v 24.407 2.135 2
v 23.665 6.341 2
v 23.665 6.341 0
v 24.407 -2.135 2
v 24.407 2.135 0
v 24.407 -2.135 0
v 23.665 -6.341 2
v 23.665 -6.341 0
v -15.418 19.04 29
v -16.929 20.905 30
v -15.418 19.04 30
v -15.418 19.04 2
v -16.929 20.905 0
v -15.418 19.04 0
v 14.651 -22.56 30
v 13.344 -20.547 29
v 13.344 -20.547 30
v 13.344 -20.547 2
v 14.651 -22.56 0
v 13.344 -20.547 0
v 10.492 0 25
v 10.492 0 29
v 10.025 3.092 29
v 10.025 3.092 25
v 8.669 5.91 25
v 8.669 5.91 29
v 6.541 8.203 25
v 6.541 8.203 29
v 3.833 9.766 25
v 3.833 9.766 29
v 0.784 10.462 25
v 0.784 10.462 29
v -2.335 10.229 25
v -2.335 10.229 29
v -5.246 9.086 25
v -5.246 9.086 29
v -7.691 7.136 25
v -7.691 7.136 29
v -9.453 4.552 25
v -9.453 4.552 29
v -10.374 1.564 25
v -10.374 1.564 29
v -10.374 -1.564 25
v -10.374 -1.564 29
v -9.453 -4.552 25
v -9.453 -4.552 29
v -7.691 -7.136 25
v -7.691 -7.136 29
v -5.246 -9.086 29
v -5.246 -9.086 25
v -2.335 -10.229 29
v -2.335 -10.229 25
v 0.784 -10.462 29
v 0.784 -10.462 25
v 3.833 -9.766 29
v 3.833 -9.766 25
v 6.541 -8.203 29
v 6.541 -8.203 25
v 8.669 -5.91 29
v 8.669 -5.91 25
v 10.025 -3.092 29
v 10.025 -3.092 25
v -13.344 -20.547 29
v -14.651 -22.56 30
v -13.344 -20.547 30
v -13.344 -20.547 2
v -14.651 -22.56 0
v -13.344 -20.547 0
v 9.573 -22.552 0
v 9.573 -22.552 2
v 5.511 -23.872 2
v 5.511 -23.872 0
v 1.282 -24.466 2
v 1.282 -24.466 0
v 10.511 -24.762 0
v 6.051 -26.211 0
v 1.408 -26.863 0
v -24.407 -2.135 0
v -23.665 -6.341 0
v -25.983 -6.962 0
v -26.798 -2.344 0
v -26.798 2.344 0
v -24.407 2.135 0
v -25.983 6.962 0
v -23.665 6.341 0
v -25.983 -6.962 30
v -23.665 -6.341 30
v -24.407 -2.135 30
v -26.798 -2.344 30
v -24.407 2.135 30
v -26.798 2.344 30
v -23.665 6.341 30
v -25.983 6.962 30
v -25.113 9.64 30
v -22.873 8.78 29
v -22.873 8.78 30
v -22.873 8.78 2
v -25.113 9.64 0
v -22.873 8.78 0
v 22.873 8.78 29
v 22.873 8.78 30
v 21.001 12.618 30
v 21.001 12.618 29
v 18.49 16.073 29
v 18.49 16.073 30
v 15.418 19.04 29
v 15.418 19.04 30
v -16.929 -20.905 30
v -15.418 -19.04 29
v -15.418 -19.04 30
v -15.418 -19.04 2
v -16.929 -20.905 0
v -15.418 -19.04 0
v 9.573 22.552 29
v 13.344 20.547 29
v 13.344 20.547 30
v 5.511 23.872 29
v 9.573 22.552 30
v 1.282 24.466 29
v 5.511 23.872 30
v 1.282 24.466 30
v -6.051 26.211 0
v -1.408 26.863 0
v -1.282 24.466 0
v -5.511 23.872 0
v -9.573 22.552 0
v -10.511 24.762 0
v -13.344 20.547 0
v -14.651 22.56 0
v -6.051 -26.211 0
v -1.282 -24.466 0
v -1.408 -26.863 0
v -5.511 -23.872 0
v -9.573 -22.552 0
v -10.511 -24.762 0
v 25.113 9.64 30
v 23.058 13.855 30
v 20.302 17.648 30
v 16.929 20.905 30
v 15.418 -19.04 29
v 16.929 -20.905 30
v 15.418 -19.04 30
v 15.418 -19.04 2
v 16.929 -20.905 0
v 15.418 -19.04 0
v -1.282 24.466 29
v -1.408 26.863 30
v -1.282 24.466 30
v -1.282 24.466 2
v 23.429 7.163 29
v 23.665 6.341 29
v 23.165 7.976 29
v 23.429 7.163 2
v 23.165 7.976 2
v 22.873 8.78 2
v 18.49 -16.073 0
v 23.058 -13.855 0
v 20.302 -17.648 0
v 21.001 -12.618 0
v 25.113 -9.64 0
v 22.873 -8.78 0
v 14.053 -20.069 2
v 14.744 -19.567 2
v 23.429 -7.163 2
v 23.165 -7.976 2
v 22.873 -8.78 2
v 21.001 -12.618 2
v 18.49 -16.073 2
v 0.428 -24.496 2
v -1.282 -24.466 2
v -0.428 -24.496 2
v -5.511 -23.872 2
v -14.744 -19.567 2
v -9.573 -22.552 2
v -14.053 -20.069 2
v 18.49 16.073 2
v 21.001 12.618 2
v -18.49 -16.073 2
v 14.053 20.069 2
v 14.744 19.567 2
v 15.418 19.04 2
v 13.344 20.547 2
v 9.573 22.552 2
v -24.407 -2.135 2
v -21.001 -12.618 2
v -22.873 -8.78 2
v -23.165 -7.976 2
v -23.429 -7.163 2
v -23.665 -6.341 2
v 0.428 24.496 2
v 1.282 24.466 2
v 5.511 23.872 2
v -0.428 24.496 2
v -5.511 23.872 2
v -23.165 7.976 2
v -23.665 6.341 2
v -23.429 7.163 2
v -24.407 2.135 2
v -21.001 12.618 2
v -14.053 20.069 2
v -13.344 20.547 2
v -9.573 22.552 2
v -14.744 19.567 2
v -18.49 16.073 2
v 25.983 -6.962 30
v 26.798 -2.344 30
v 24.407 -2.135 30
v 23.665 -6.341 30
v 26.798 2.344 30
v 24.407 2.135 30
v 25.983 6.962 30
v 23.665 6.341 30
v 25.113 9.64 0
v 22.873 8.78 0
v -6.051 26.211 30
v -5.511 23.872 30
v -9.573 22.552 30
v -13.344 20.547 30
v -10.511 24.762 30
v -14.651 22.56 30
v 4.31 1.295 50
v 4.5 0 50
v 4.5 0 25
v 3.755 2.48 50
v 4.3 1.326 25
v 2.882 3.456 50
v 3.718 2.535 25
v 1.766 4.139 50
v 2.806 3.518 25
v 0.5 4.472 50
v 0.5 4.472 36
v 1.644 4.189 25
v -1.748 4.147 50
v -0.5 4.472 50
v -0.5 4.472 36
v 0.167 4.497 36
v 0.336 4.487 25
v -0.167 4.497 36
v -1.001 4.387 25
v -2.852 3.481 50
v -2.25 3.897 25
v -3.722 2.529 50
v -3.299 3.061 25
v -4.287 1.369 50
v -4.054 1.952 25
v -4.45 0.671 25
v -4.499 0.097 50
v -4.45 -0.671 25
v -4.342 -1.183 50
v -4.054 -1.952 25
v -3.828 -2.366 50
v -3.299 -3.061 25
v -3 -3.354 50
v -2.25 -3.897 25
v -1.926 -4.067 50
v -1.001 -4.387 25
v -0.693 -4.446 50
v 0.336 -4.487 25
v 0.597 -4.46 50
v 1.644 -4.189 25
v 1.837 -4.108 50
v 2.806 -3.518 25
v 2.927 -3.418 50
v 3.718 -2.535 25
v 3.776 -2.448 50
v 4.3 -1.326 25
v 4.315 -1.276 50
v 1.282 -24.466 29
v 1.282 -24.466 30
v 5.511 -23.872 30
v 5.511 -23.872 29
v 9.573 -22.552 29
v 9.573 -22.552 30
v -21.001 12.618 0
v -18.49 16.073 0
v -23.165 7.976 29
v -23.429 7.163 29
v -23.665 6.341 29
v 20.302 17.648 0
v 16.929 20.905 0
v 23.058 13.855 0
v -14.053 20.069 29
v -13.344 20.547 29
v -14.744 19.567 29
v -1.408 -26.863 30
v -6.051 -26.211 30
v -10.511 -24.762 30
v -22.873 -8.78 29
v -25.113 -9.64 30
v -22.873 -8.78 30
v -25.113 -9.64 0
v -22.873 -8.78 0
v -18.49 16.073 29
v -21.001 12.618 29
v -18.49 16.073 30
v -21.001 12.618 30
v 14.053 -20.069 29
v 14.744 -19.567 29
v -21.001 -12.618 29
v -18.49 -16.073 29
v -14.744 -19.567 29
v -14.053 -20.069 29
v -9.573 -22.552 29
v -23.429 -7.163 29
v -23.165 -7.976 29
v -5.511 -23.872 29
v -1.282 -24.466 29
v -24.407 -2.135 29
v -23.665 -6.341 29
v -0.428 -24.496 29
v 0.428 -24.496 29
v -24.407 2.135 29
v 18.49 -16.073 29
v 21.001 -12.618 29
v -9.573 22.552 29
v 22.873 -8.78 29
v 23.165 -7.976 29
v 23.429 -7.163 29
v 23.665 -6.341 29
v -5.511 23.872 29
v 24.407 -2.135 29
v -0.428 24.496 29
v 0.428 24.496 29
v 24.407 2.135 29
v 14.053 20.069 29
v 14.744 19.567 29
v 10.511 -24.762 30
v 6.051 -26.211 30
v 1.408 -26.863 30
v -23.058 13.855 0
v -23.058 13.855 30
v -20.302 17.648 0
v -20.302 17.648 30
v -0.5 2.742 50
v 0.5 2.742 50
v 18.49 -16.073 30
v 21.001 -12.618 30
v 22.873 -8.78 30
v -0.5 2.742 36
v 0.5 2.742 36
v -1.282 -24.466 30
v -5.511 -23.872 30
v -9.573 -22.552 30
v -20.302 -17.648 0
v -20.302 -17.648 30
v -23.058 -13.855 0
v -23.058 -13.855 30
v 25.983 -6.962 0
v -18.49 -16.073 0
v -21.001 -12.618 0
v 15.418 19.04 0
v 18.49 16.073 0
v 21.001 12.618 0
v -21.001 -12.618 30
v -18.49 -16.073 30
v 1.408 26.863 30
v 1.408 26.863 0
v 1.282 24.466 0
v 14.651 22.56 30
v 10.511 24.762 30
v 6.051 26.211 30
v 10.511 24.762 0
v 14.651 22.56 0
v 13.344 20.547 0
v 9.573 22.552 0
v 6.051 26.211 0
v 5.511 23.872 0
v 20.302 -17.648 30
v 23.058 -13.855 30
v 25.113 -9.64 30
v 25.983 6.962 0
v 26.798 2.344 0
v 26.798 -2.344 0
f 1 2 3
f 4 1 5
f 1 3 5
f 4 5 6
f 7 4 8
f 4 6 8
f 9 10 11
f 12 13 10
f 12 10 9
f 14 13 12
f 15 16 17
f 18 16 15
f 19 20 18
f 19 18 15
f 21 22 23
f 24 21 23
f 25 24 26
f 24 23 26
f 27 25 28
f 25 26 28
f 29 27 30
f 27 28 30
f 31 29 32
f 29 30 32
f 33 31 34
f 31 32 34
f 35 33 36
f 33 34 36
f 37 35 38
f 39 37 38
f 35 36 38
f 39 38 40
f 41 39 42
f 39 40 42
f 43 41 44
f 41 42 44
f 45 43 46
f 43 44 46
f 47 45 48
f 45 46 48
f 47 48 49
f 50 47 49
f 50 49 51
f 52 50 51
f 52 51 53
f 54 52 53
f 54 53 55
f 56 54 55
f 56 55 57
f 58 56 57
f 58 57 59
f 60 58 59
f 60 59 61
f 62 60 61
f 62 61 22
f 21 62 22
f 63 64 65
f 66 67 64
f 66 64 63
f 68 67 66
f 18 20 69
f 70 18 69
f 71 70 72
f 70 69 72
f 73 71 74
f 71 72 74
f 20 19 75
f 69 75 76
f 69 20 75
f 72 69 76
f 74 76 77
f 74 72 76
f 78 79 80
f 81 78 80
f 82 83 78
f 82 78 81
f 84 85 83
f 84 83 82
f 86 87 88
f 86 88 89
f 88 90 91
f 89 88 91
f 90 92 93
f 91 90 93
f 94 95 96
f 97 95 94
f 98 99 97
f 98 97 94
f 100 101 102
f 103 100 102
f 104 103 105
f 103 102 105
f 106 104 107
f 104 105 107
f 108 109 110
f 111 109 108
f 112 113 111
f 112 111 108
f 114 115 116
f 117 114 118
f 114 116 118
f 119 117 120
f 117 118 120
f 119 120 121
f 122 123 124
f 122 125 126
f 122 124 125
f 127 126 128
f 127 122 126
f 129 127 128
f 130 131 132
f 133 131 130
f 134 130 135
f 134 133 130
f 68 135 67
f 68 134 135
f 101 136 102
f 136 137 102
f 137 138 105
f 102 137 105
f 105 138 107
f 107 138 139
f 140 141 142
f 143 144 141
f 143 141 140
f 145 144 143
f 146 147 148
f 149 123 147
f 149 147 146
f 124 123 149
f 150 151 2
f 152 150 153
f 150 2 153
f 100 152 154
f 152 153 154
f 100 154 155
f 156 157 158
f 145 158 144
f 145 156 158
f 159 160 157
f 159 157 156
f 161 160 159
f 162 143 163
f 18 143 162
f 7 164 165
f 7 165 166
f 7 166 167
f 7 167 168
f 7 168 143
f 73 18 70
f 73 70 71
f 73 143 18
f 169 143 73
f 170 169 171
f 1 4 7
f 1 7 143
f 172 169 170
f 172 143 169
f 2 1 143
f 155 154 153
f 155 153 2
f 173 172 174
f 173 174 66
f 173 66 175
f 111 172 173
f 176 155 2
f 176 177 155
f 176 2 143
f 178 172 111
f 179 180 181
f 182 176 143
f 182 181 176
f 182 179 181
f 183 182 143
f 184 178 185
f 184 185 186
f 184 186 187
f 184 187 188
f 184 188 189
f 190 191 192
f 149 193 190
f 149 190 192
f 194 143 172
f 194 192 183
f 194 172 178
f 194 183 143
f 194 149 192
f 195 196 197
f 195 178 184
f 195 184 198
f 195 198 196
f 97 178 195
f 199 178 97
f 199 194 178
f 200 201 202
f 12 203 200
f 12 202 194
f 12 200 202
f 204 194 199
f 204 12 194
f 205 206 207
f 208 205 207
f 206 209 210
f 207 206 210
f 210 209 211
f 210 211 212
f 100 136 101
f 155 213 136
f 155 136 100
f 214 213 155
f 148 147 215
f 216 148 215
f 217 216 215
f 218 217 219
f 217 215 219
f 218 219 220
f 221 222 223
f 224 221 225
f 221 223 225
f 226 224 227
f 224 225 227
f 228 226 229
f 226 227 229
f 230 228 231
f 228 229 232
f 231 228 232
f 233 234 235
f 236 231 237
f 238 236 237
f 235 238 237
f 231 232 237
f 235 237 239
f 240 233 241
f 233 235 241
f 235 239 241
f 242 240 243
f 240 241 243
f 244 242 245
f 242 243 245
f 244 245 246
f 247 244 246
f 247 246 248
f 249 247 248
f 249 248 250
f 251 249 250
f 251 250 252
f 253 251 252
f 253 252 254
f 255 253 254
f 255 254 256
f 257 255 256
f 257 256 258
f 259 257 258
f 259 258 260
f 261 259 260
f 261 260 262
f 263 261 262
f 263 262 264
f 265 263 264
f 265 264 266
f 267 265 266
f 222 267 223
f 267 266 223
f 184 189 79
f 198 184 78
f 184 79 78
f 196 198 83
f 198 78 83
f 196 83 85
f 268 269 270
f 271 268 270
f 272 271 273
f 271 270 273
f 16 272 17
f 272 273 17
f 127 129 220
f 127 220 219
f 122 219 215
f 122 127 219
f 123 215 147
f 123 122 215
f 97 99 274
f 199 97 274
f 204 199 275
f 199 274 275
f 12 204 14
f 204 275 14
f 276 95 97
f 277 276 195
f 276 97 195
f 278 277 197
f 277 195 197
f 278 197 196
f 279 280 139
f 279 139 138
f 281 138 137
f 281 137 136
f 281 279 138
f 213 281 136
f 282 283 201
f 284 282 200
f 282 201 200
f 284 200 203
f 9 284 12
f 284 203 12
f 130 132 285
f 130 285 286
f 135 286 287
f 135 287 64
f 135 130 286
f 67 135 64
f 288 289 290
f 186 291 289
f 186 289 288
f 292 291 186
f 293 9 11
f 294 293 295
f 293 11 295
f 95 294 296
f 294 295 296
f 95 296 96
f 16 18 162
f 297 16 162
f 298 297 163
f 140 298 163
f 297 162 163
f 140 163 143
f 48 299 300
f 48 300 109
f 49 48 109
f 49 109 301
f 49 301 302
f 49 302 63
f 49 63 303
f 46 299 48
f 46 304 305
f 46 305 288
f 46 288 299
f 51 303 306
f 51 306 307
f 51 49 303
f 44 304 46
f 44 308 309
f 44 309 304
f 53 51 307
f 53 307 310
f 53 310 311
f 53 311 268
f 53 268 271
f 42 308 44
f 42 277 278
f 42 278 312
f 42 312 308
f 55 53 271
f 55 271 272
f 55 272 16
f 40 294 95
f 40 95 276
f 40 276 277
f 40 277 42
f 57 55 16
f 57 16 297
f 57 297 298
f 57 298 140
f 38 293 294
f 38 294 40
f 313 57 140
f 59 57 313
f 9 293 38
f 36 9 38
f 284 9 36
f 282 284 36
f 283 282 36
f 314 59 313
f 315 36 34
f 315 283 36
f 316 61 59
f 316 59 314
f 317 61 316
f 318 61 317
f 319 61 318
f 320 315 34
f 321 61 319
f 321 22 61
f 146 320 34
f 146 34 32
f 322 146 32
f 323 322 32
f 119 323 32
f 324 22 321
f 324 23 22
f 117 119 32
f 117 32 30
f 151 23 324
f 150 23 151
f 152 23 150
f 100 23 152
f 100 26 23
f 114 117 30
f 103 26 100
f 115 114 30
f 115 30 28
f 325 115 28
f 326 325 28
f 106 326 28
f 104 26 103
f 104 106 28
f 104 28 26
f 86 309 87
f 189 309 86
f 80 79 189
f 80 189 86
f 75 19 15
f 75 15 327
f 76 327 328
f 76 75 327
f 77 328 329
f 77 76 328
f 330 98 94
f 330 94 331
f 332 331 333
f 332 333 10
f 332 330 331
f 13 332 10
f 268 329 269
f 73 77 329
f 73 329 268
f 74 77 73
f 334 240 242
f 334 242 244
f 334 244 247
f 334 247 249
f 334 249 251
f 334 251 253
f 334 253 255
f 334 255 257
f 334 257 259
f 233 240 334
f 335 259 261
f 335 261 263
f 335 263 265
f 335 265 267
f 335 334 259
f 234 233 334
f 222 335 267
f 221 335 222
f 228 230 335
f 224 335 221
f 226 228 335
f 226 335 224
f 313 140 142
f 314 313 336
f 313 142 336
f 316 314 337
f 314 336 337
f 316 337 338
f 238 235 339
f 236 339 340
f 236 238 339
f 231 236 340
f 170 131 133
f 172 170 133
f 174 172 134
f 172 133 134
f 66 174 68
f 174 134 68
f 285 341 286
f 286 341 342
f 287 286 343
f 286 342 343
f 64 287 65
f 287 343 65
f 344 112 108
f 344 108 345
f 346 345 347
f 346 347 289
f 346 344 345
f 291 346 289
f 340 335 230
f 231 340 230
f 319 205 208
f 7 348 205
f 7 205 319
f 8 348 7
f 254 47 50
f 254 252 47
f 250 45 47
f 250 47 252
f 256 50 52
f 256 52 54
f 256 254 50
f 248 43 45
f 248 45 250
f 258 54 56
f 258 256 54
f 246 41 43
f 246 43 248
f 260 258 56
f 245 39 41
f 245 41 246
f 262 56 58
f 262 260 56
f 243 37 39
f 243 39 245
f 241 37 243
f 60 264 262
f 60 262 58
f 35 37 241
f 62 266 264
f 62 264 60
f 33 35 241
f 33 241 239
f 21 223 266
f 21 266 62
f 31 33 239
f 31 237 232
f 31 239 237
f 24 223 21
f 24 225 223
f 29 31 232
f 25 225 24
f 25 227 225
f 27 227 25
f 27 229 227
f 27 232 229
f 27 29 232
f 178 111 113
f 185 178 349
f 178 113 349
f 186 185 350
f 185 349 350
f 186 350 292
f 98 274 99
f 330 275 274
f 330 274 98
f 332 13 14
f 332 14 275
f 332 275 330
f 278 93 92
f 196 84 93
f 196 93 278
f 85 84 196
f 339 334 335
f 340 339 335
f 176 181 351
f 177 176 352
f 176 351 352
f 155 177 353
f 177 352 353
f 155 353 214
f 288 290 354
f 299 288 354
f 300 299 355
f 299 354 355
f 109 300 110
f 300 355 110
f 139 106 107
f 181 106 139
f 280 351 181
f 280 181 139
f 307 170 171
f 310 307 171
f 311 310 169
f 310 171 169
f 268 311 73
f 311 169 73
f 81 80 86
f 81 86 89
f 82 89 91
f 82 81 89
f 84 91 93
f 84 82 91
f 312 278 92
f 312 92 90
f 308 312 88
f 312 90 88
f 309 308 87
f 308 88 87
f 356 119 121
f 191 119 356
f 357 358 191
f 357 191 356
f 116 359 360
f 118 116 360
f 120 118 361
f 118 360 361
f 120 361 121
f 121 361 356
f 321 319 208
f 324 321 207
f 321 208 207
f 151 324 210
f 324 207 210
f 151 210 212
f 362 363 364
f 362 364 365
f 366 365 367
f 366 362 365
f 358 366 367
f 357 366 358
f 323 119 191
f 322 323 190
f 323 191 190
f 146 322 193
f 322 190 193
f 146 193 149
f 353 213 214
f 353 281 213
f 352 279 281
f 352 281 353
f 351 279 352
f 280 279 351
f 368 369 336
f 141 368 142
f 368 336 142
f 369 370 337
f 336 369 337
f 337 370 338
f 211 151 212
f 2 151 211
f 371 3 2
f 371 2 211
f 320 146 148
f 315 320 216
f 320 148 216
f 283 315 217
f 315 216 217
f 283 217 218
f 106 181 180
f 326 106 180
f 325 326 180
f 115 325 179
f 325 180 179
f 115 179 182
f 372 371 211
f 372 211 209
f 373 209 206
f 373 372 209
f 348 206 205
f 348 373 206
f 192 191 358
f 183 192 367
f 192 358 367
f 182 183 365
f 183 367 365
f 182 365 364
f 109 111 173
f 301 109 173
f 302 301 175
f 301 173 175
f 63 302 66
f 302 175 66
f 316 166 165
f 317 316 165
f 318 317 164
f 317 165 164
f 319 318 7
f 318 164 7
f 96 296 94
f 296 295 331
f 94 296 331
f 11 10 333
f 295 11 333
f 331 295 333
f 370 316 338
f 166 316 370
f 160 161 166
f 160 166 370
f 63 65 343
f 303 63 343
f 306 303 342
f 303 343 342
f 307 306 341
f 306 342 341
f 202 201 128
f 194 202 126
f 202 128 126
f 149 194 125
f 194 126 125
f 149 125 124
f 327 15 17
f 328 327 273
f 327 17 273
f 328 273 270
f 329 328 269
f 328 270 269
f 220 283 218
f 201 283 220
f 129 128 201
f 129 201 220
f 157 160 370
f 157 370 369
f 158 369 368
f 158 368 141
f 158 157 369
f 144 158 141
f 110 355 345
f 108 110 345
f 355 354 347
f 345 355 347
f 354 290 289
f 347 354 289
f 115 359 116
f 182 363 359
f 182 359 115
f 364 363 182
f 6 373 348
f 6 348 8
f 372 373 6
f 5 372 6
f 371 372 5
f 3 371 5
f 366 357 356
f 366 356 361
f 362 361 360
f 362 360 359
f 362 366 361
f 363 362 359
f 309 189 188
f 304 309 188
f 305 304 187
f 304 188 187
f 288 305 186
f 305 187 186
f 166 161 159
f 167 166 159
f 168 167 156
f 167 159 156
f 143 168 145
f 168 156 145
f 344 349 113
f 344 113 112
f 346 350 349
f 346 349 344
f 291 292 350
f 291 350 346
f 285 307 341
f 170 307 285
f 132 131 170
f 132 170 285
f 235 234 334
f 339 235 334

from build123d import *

# Parameters (mm, degrees)
SKETCH1_R           = 24.5
BOSS_EXTRUDE1_DEPTH = 30
SKETCH2_R           = 10.491597787
CUT_EXTRUDE1_DEPTH  = 5
BOSS_EXTRUDE3_DEPTH = 30
SKETCH6_R           = 24.5
CUT_EXTRUDE2_DEPTH  = 2
SKETCH7_R           = 24.5
CUT_EXTRUDE4_DEPTH  = 1
SKETCH4_R           = 4.5
BOSS_EXTRUDE4_DEPTH = 25
CUT_EXTRUDE5_DEPTH  = 14


with BuildPart() as part:
    # Sketch1 → Boss-Extrude1 (new body)
    with BuildSketch(Plane.XY):
        Circle(SKETCH1_R)
    extrude(amount=BOSS_EXTRUDE1_DEPTH)

    # Sketch2 → Cut-Extrude1 (cut)
    with BuildSketch(Plane.XY.offset(30)):
        Circle(SKETCH2_R)
    extrude(amount=-CUT_EXTRUDE1_DEPTH, mode=Mode.SUBTRACT)

    # Sketch5 → Boss-Extrude3 (add)
    with BuildSketch(Plane(origin=(0, 0, 0), x_dir=(-1, 0, 0), z_dir=(0, 0, -1))):
        with BuildLine():
            ThreePointArc((-1.28221594, -24.466424387), (-7.570916362, -23.300884649), (-13.343668945, -20.54742074))
            Line((-13.343668945, -20.54742074), (-14.650803863, -22.560229302))
            ThreePointArc((-14.650803863, -22.560229302), (-8.312557149, -25.583420288), (-1.407820766, -26.863135347))
            Line((-1.407820766, -26.863135347), (-1.28221594, -24.466424387))
        make_face()
        with BuildLine():
            ThreePointArc((13.343668945, -20.54742074), (7.570916362, -23.300884649), (1.28221594, -24.466424387))
            Line((1.28221594, -24.466424387), (1.407820766, -26.863135347))
            ThreePointArc((1.407820766, -26.863135347), (8.312557149, -25.583420288), (14.650803863, -22.560229302))
            Line((14.650803863, -22.560229302), (13.343668945, -20.54742074))
        make_face()
        with BuildLine():
            ThreePointArc((22.872725828, -8.780000752), (19.820916362, -14.400738681), (15.418337917, -19.040085501))
            Line((15.418337917, -19.040085501), (16.928705712, -20.905236734))
            ThreePointArc((16.928705712, -20.905236734), (21.762557149, -15.811423287), (25.113319378, -9.640082458))
            Line((25.113319378, -9.640082458), (22.872725828, -8.780000752))
        make_face()
        with BuildLine():
            Line((25.983400462, 6.962248231), (23.665178859, 6.341081103))
            ThreePointArc((23.665178859, 6.341081103), (24.290398124, 3.19789915), (24.5, 0))
            ThreePointArc((24.5, 0), (24.290398124, -3.19789915), (23.665178859, -6.341081103))
            Line((23.665178859, -6.341081103), (25.983400462, -6.962248231))
            ThreePointArc((25.983400462, -6.962248231), (26.9, 0), (25.983400462, 6.962248231))
        make_face()
        with BuildLine():
            Line((16.928705712, 20.905236734), (15.418337917, 19.040085501))
            ThreePointArc((15.418337917, 19.040085501), (19.820916362, 14.400738681), (22.872725828, 8.780000752))
            Line((22.872725828, 8.780000752), (25.113319378, 9.640082458))
            ThreePointArc((25.113319378, 9.640082458), (21.762557149, 15.811423287), (16.928705712, 20.905236734))
        make_face()
        with BuildLine():
            Line((1.407820766, 26.863135347), (1.28221594, 24.466424387))
            ThreePointArc((1.28221594, 24.466424387), (7.570916362, 23.300884649), (13.343668945, 20.54742074))
            Line((13.343668945, 20.54742074), (14.650803863, 22.560229302))
            ThreePointArc((14.650803863, 22.560229302), (8.312557149, 25.583420288), (1.407820766, 26.863135347))
        make_face()
        with BuildLine():
            Line((-14.650803863, 22.560229302), (-13.343668945, 20.54742074))
            ThreePointArc((-13.343668945, 20.54742074), (-7.570916362, 23.300884649), (-1.28221594, 24.466424387))
            Line((-1.28221594, 24.466424387), (-1.407820766, 26.863135347))
            ThreePointArc((-1.407820766, 26.863135347), (-8.312557149, 25.583420288), (-14.650803863, 22.560229302))
        make_face()
        with BuildLine():
            Line((-25.113319378, 9.640082458), (-22.872725828, 8.780000752))
            ThreePointArc((-22.872725828, 8.780000752), (-19.820916362, 14.400738681), (-15.418337917, 19.040085501))
            Line((-15.418337917, 19.040085501), (-16.928705712, 20.905236734))
            ThreePointArc((-16.928705712, 20.905236734), (-21.762557149, 15.811423287), (-25.113319378, 9.640082458))
        make_face()
        with BuildLine():
            ThreePointArc((-23.665178859, -6.341081103), (-24.5, 0), (-23.665178859, 6.341081103))
            Line((-23.665178859, 6.341081103), (-25.983400462, 6.962248231))
            ThreePointArc((-25.983400462, 6.962248231), (-26.9, 0), (-25.983400462, -6.962248231))
            Line((-25.983400462, -6.962248231), (-23.665178859, -6.341081103))
        make_face()
        with BuildLine():
            ThreePointArc((-15.418337917, -19.040085501), (-19.820916362, -14.400738681), (-22.872725828, -8.780000752))
            Line((-22.872725828, -8.780000752), (-25.113319378, -9.640082458))
            ThreePointArc((-25.113319378, -9.640082458), (-21.762557149, -15.811423287), (-16.928705712, -20.905236734))
            Line((-16.928705712, -20.905236734), (-15.418337917, -19.040085501))
        make_face()
    extrude(amount=-BOSS_EXTRUDE3_DEPTH)

    # Sketch6 → Cut-Extrude2 (cut)
    with BuildSketch(Plane(origin=(0, 0, 0), x_dir=(-1, 0, 0), z_dir=(0, 0, -1))):
        Circle(SKETCH6_R)
    extrude(amount=-CUT_EXTRUDE2_DEPTH, mode=Mode.SUBTRACT)

    # Sketch7 → Cut-Extrude4 (cut)
    with BuildSketch(Plane.XY.offset(30)):
        Circle(SKETCH7_R)
    extrude(amount=-CUT_EXTRUDE4_DEPTH, mode=Mode.SUBTRACT)

    # Sketch4 → Boss-Extrude4 (add)
    with BuildSketch(Plane.XY.offset(25)):
        Circle(SKETCH4_R)
    extrude(amount=BOSS_EXTRUDE4_DEPTH)

    # Sketch8 → Cut-Extrude5 (cut)
    with BuildSketch(Plane.XY.offset(50)):
        with BuildLine():
            Line((-0.5, 2.742191979), (0.5, 2.742191979))
            Line((0.5, 2.742191979), (0.5, 4.472135955))
            ThreePointArc((0.5, 4.472135955), (0, 4.5), (-0.5, 4.472135955))
            Line((-0.5, 4.472135955), (-0.5, 2.742191979))
        make_face()
    extrude(amount=-CUT_EXTRUDE5_DEPTH, mode=Mode.SUBTRACT)


solid = part.part
